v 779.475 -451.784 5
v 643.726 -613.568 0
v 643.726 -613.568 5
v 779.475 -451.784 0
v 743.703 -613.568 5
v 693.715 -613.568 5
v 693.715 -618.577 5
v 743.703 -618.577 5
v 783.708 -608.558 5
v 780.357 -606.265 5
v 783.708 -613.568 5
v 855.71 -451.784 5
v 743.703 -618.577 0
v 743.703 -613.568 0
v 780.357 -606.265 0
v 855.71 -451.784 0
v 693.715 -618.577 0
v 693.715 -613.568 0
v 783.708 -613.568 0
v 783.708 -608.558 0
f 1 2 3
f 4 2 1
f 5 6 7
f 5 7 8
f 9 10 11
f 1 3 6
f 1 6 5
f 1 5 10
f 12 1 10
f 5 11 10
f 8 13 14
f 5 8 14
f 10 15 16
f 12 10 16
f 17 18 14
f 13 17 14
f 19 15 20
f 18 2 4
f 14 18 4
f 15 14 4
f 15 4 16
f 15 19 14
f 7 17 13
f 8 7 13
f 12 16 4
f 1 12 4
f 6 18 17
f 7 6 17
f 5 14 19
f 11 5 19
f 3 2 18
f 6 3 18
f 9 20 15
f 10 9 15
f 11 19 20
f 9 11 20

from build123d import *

# Parameters (mm, degrees)
PAD003_DEPTH = 5


with BuildPart() as part:
    # Sketch003 → Pad003 (new body)
    with BuildSketch(Plane.XY):
        with BuildLine():
            add(Edge.make_bspline(
                [(643.726206, -613.567651), (693.714816, -613.567651)],
                knots=[0, 0, 141.7, 141.7], degree=1))
            add(Edge.make_bspline(
                [(693.714816, -613.567651), (693.714816, -618.577095)],
                knots=[0, 0, 14.2, 14.2], degree=1))
            add(Edge.make_bspline(
                [(693.714816, -618.577095), (743.703426, -618.577095)],
                knots=[0, 0, 141.7, 141.7], degree=1))
            add(Edge.make_bspline(
                [(743.703426, -618.577095), (743.703426, -613.567651)],
                knots=[0, 0, 14.2, 14.2], degree=1))
            add(Edge.make_bspline(
                [(743.703426, -613.567651), (783.708425, -613.567651)],
                knots=[0, 0, 113.4, 113.4], degree=1))
            add(Edge.make_bspline(
                [(783.708425, -613.567651), (783.708425, -608.558207)],
                knots=[0, 0, 14.2, 14.2], degree=1))
            add(Edge.make_bspline(
                [(783.708425, -608.558207), (780.357036, -606.265151)],
                knots=[0, 0, 11.510864, 11.510864], degree=1))
            add(Edge.make_bspline(
                [(780.357036, -606.265151), (855.710368, -451.783766)],
                knots=[0, 0, 487.21799, 487.21799], degree=1))
            add(Edge.make_bspline(
                [(855.710368, -451.783766), (779.475092, -451.783766)],
                knots=[0, 0, 216.1, 216.1], degree=1))
            add(Edge.make_bspline(
                [(643.726206, -613.567651), (779.475092, -451.783766)],
                knots=[0, 0, 598.652654, 598.652654], degree=1))
        make_face()
    extrude(amount=PAD003_DEPTH)


solid = part.part
